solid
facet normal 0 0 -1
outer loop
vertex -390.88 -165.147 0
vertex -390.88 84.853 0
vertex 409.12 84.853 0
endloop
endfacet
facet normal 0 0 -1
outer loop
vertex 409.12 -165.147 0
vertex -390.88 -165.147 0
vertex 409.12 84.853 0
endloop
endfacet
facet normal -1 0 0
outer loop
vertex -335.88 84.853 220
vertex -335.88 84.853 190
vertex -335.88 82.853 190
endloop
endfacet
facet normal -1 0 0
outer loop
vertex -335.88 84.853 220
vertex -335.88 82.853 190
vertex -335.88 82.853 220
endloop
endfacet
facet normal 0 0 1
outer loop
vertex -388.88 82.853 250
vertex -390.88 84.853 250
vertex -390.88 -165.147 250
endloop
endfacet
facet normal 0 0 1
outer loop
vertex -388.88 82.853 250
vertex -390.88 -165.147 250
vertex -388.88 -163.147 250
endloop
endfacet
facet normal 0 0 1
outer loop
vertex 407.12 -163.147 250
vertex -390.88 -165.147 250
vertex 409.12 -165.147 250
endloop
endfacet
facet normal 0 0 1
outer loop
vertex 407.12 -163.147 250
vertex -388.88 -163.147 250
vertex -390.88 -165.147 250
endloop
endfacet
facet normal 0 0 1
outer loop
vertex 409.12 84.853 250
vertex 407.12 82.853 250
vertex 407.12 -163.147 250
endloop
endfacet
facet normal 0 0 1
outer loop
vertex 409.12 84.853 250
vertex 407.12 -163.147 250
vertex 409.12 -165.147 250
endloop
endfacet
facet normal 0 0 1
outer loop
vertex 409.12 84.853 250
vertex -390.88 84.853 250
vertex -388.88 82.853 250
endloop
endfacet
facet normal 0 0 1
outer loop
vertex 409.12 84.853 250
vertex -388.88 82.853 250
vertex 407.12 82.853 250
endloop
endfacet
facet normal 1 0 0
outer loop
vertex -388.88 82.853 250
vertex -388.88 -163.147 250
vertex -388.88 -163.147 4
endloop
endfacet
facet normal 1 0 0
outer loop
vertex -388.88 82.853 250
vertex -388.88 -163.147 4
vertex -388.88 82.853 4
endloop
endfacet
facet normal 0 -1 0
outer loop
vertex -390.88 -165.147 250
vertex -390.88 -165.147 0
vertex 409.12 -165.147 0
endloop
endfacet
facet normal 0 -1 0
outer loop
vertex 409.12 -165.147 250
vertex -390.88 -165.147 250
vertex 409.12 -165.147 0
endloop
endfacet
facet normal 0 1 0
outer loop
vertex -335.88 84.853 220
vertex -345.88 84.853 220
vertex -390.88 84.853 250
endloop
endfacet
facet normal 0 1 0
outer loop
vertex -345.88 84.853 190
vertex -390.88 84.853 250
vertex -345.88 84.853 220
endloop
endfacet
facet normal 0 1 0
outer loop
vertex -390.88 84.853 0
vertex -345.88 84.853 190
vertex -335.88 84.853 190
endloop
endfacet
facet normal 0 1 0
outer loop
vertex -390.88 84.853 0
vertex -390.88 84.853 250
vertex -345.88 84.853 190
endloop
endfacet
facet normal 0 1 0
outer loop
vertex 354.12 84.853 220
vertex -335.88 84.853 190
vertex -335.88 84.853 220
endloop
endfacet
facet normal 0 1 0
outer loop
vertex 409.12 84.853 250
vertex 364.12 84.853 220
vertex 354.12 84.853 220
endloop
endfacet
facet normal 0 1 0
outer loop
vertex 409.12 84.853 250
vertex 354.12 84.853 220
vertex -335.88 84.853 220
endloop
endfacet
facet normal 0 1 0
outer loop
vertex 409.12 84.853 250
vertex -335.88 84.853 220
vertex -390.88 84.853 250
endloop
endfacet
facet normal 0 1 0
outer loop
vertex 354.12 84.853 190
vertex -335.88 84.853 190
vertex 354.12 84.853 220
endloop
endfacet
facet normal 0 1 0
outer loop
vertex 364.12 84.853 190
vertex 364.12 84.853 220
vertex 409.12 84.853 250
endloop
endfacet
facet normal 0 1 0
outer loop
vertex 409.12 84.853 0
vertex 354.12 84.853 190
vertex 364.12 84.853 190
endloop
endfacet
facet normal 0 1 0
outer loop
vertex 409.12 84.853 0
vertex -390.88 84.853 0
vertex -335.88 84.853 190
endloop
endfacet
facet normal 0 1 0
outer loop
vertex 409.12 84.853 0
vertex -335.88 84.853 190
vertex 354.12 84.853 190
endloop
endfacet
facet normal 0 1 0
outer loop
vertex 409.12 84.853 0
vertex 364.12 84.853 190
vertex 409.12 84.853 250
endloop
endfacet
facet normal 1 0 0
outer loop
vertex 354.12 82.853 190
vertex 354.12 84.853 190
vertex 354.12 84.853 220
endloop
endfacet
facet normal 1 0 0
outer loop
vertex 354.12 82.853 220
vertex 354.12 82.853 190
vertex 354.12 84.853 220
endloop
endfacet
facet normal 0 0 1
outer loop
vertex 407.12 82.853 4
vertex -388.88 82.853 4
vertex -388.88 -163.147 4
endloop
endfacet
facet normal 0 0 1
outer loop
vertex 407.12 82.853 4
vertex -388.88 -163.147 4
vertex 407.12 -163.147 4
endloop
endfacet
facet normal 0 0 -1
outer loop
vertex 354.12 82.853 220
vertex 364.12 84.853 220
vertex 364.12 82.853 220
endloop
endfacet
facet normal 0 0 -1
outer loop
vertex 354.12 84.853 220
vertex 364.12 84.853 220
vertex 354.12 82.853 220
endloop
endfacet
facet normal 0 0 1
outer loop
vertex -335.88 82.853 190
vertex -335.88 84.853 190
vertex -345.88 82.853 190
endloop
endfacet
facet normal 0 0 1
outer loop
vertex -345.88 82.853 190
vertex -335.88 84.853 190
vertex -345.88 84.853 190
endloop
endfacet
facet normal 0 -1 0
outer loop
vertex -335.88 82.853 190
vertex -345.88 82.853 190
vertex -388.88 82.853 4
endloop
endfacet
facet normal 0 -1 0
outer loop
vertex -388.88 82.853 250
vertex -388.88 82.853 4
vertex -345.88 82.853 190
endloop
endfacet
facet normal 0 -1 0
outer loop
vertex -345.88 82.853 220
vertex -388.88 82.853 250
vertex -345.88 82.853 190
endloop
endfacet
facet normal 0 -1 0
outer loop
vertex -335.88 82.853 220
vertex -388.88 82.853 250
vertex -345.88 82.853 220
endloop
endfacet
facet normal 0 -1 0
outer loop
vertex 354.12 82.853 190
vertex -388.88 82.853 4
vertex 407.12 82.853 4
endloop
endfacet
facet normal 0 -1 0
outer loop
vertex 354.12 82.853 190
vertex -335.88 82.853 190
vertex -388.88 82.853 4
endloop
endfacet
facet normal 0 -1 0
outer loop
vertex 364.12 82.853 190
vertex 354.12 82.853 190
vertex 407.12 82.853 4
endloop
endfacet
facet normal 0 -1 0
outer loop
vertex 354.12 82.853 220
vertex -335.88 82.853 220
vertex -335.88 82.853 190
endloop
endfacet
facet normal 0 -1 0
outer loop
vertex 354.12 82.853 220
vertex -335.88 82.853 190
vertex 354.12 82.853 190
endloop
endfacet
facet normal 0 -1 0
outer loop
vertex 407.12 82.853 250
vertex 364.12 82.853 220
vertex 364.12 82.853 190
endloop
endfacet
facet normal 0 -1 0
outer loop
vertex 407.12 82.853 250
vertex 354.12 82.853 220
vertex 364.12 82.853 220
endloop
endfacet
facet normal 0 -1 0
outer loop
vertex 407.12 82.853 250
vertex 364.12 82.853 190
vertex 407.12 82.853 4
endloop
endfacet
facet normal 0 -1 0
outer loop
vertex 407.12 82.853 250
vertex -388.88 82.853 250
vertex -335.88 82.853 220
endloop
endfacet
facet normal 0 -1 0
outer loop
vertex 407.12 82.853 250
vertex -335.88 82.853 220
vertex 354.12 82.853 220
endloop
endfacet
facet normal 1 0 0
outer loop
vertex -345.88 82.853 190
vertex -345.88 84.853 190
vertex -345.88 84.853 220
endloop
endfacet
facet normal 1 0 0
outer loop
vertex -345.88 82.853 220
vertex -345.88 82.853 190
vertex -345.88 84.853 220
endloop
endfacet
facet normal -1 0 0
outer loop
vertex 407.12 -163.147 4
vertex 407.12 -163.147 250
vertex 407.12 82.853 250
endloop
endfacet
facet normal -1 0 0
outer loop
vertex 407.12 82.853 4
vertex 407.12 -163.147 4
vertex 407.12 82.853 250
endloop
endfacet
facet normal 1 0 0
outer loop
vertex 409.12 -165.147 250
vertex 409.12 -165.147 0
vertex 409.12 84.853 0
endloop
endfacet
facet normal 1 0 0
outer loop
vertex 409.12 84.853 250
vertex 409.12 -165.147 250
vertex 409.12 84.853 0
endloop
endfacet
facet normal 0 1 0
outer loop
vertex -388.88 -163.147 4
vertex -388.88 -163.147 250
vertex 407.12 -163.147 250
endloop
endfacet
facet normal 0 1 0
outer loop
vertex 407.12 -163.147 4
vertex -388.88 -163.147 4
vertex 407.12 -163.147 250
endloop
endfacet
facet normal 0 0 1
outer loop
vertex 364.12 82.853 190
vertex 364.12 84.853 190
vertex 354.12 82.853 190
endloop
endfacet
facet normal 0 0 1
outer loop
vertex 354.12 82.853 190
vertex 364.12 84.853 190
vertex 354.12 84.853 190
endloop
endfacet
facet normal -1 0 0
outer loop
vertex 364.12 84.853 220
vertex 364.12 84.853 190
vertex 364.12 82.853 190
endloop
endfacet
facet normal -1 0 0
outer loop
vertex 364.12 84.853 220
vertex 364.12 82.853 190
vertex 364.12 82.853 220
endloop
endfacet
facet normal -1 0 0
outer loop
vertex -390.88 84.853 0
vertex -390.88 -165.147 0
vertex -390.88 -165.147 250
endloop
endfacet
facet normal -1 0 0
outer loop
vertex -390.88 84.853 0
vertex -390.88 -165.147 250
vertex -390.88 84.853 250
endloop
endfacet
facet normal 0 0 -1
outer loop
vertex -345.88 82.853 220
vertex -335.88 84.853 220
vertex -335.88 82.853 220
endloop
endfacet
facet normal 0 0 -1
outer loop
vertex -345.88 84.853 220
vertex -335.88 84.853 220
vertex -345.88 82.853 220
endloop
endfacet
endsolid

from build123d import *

# Parameters (mm, degrees)
F0_W     = 800
F0_H     = 250
F1_DEPTH = 250
F2_W     = 796
F2_H     = 246
F3_DEPTH = 246
F4_W     = 10
F4_H     = 30
F5_DEPTH = 2


with BuildPart() as f1:
    # F0 (on Top) → F1 (new body)
    with BuildSketch(Plane.XY):
        with Locations((9.119717, -40.146783)):
            Rectangle(F0_W, F0_H)
    extrude(amount=F1_DEPTH)

    # F2 (on face) → F3 (cut)
    with BuildSketch(Plane.XY.offset(250)):
        with Locations((9.119717, -40.146783)):
            Rectangle(F2_W, F2_H)
    extrude(amount=-F3_DEPTH, mode=Mode.SUBTRACT)

    # F4 (on face) → F5 (cut, through all)
    with BuildSketch(Plane(origin=(0, 84.853217, 0), x_dir=(-1, 0, 0), z_dir=(0, 1, 0))):
        with Locations((-359.119717, 205)):
            Rectangle(F4_W, F4_H)
        with Locations((340.880283, 205)):
            Rectangle(F4_W, F4_H)
    extrude(amount=-F5_DEPTH, mode=Mode.SUBTRACT)


solid = f1.part
